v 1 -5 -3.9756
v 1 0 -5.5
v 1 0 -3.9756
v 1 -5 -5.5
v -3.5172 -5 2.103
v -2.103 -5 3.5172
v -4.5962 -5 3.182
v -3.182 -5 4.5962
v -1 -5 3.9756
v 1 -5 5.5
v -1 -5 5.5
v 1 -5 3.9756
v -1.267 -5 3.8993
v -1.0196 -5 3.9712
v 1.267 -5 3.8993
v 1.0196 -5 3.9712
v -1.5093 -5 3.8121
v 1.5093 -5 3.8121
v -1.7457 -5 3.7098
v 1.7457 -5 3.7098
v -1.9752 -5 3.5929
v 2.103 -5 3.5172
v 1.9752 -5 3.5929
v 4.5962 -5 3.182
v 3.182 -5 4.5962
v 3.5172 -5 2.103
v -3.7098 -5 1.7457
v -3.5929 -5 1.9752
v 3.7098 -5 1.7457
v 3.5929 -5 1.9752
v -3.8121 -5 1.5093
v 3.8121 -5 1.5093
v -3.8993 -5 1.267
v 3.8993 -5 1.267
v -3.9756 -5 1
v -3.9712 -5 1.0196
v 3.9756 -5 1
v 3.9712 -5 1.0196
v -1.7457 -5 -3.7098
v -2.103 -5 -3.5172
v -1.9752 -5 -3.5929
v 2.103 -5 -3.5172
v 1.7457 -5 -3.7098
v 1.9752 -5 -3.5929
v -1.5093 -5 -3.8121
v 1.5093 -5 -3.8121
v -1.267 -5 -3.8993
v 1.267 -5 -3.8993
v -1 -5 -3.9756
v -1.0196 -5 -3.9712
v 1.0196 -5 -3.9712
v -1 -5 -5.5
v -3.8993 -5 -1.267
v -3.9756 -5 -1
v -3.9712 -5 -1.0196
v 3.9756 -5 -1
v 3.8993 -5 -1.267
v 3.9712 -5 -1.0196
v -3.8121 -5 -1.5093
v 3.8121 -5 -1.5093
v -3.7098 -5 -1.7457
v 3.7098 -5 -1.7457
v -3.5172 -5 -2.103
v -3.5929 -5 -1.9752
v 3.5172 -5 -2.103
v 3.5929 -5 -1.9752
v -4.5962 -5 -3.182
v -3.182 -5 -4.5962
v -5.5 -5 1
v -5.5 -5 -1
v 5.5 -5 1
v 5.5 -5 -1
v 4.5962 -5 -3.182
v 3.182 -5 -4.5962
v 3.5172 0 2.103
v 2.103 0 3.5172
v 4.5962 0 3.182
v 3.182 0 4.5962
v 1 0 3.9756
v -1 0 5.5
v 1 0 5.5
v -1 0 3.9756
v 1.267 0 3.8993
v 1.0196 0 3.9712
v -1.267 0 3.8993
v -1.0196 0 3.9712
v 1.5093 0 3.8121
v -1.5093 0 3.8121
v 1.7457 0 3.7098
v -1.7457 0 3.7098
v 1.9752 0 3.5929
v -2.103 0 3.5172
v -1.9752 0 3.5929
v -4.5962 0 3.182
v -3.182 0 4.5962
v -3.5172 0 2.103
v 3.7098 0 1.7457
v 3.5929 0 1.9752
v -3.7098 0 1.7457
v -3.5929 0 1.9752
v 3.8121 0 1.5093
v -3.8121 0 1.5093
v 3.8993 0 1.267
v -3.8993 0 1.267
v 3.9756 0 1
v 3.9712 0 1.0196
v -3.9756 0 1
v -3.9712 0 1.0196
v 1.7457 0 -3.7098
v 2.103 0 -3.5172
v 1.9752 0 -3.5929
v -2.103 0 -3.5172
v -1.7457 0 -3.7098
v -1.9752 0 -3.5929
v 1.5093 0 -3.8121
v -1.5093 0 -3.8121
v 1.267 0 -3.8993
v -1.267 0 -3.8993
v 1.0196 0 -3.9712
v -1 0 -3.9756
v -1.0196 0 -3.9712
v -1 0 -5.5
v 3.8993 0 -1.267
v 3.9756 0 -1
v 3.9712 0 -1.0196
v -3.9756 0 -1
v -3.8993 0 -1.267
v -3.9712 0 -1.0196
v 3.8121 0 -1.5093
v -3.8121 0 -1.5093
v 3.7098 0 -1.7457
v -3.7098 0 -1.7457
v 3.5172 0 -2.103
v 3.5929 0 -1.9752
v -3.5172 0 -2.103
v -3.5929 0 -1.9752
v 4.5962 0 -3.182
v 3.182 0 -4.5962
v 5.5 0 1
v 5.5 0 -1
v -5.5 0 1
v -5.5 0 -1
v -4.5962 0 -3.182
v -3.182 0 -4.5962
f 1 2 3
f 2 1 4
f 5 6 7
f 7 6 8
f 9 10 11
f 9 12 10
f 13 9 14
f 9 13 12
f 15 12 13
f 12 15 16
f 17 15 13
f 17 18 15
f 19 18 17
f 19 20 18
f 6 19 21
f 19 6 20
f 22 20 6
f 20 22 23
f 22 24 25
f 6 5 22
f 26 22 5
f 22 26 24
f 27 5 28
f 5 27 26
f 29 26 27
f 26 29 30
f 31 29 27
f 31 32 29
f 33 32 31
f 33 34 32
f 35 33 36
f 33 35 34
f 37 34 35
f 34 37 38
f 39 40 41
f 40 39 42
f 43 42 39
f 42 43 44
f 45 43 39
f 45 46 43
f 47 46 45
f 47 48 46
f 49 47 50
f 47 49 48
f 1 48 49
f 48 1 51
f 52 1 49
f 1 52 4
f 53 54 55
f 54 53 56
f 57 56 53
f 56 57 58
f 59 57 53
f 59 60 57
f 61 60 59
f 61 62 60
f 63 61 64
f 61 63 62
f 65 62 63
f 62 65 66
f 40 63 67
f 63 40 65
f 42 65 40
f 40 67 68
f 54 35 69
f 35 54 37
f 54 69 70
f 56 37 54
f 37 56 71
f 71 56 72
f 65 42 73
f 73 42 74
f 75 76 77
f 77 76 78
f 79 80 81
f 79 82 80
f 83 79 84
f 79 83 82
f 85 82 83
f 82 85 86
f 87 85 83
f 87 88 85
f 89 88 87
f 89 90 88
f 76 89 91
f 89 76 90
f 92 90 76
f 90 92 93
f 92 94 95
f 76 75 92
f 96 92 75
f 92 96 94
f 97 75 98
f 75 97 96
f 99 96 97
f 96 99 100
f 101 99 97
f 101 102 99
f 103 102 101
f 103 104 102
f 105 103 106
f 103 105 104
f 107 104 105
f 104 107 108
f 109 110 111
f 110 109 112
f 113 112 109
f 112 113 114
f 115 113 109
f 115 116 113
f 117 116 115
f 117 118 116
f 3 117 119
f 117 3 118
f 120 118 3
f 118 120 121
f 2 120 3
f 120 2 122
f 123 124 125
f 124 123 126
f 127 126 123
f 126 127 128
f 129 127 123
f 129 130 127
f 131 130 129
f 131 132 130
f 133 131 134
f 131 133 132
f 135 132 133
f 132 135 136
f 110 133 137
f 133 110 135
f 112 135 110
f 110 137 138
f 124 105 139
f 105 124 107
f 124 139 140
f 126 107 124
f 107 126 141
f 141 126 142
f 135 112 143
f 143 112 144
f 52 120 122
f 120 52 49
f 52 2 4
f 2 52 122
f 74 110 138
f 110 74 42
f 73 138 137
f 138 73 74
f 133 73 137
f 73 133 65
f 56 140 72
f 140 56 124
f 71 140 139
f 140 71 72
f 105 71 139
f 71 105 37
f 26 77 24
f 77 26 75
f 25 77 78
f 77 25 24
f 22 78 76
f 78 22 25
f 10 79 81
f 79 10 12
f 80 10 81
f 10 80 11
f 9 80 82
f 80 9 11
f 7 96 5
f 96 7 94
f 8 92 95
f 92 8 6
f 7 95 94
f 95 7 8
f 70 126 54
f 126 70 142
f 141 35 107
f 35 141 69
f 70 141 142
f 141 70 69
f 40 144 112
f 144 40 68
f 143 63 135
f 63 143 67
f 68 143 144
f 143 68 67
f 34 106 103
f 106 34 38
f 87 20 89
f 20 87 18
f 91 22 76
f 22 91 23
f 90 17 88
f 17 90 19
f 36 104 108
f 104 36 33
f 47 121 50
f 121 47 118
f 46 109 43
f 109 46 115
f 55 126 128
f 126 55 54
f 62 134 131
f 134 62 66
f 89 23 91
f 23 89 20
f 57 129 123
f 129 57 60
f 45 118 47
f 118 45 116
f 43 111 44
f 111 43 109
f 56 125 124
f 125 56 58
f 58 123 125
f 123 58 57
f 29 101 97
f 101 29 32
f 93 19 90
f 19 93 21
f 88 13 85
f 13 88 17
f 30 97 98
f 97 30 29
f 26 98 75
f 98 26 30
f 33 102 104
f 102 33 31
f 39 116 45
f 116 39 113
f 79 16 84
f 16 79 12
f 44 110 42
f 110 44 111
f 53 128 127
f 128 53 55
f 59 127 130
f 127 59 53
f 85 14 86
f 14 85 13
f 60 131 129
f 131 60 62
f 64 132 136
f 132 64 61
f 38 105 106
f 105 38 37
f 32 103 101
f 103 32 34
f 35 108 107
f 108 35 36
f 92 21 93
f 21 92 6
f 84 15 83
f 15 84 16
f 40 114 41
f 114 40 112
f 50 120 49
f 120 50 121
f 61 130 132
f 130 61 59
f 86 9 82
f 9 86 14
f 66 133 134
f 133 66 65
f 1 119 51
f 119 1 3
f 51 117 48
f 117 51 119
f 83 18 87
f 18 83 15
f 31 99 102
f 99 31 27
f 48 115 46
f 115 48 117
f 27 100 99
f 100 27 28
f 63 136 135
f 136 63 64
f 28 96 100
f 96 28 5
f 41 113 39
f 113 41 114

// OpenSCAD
diameter_binnenste_asgaten=4.1;



	union(){
        translate([0,0,0]){
            rotate([90,0,0]){
                for (hoek =[0:45:360])
                rotate([0,0,hoek]){
                    translate([-1,-5.5,0]){
                        rotate([0,0,0]){
                            cube([2,5,5], center=false);
                        }
                    }
                }
            }
        }

        translate([0,0,0]){
            rotate([90,0,0]){
                cylinder(h=5, r=diameter_binnenste_asgaten, $fn=100, center=false);
            }
        }
        
	}
